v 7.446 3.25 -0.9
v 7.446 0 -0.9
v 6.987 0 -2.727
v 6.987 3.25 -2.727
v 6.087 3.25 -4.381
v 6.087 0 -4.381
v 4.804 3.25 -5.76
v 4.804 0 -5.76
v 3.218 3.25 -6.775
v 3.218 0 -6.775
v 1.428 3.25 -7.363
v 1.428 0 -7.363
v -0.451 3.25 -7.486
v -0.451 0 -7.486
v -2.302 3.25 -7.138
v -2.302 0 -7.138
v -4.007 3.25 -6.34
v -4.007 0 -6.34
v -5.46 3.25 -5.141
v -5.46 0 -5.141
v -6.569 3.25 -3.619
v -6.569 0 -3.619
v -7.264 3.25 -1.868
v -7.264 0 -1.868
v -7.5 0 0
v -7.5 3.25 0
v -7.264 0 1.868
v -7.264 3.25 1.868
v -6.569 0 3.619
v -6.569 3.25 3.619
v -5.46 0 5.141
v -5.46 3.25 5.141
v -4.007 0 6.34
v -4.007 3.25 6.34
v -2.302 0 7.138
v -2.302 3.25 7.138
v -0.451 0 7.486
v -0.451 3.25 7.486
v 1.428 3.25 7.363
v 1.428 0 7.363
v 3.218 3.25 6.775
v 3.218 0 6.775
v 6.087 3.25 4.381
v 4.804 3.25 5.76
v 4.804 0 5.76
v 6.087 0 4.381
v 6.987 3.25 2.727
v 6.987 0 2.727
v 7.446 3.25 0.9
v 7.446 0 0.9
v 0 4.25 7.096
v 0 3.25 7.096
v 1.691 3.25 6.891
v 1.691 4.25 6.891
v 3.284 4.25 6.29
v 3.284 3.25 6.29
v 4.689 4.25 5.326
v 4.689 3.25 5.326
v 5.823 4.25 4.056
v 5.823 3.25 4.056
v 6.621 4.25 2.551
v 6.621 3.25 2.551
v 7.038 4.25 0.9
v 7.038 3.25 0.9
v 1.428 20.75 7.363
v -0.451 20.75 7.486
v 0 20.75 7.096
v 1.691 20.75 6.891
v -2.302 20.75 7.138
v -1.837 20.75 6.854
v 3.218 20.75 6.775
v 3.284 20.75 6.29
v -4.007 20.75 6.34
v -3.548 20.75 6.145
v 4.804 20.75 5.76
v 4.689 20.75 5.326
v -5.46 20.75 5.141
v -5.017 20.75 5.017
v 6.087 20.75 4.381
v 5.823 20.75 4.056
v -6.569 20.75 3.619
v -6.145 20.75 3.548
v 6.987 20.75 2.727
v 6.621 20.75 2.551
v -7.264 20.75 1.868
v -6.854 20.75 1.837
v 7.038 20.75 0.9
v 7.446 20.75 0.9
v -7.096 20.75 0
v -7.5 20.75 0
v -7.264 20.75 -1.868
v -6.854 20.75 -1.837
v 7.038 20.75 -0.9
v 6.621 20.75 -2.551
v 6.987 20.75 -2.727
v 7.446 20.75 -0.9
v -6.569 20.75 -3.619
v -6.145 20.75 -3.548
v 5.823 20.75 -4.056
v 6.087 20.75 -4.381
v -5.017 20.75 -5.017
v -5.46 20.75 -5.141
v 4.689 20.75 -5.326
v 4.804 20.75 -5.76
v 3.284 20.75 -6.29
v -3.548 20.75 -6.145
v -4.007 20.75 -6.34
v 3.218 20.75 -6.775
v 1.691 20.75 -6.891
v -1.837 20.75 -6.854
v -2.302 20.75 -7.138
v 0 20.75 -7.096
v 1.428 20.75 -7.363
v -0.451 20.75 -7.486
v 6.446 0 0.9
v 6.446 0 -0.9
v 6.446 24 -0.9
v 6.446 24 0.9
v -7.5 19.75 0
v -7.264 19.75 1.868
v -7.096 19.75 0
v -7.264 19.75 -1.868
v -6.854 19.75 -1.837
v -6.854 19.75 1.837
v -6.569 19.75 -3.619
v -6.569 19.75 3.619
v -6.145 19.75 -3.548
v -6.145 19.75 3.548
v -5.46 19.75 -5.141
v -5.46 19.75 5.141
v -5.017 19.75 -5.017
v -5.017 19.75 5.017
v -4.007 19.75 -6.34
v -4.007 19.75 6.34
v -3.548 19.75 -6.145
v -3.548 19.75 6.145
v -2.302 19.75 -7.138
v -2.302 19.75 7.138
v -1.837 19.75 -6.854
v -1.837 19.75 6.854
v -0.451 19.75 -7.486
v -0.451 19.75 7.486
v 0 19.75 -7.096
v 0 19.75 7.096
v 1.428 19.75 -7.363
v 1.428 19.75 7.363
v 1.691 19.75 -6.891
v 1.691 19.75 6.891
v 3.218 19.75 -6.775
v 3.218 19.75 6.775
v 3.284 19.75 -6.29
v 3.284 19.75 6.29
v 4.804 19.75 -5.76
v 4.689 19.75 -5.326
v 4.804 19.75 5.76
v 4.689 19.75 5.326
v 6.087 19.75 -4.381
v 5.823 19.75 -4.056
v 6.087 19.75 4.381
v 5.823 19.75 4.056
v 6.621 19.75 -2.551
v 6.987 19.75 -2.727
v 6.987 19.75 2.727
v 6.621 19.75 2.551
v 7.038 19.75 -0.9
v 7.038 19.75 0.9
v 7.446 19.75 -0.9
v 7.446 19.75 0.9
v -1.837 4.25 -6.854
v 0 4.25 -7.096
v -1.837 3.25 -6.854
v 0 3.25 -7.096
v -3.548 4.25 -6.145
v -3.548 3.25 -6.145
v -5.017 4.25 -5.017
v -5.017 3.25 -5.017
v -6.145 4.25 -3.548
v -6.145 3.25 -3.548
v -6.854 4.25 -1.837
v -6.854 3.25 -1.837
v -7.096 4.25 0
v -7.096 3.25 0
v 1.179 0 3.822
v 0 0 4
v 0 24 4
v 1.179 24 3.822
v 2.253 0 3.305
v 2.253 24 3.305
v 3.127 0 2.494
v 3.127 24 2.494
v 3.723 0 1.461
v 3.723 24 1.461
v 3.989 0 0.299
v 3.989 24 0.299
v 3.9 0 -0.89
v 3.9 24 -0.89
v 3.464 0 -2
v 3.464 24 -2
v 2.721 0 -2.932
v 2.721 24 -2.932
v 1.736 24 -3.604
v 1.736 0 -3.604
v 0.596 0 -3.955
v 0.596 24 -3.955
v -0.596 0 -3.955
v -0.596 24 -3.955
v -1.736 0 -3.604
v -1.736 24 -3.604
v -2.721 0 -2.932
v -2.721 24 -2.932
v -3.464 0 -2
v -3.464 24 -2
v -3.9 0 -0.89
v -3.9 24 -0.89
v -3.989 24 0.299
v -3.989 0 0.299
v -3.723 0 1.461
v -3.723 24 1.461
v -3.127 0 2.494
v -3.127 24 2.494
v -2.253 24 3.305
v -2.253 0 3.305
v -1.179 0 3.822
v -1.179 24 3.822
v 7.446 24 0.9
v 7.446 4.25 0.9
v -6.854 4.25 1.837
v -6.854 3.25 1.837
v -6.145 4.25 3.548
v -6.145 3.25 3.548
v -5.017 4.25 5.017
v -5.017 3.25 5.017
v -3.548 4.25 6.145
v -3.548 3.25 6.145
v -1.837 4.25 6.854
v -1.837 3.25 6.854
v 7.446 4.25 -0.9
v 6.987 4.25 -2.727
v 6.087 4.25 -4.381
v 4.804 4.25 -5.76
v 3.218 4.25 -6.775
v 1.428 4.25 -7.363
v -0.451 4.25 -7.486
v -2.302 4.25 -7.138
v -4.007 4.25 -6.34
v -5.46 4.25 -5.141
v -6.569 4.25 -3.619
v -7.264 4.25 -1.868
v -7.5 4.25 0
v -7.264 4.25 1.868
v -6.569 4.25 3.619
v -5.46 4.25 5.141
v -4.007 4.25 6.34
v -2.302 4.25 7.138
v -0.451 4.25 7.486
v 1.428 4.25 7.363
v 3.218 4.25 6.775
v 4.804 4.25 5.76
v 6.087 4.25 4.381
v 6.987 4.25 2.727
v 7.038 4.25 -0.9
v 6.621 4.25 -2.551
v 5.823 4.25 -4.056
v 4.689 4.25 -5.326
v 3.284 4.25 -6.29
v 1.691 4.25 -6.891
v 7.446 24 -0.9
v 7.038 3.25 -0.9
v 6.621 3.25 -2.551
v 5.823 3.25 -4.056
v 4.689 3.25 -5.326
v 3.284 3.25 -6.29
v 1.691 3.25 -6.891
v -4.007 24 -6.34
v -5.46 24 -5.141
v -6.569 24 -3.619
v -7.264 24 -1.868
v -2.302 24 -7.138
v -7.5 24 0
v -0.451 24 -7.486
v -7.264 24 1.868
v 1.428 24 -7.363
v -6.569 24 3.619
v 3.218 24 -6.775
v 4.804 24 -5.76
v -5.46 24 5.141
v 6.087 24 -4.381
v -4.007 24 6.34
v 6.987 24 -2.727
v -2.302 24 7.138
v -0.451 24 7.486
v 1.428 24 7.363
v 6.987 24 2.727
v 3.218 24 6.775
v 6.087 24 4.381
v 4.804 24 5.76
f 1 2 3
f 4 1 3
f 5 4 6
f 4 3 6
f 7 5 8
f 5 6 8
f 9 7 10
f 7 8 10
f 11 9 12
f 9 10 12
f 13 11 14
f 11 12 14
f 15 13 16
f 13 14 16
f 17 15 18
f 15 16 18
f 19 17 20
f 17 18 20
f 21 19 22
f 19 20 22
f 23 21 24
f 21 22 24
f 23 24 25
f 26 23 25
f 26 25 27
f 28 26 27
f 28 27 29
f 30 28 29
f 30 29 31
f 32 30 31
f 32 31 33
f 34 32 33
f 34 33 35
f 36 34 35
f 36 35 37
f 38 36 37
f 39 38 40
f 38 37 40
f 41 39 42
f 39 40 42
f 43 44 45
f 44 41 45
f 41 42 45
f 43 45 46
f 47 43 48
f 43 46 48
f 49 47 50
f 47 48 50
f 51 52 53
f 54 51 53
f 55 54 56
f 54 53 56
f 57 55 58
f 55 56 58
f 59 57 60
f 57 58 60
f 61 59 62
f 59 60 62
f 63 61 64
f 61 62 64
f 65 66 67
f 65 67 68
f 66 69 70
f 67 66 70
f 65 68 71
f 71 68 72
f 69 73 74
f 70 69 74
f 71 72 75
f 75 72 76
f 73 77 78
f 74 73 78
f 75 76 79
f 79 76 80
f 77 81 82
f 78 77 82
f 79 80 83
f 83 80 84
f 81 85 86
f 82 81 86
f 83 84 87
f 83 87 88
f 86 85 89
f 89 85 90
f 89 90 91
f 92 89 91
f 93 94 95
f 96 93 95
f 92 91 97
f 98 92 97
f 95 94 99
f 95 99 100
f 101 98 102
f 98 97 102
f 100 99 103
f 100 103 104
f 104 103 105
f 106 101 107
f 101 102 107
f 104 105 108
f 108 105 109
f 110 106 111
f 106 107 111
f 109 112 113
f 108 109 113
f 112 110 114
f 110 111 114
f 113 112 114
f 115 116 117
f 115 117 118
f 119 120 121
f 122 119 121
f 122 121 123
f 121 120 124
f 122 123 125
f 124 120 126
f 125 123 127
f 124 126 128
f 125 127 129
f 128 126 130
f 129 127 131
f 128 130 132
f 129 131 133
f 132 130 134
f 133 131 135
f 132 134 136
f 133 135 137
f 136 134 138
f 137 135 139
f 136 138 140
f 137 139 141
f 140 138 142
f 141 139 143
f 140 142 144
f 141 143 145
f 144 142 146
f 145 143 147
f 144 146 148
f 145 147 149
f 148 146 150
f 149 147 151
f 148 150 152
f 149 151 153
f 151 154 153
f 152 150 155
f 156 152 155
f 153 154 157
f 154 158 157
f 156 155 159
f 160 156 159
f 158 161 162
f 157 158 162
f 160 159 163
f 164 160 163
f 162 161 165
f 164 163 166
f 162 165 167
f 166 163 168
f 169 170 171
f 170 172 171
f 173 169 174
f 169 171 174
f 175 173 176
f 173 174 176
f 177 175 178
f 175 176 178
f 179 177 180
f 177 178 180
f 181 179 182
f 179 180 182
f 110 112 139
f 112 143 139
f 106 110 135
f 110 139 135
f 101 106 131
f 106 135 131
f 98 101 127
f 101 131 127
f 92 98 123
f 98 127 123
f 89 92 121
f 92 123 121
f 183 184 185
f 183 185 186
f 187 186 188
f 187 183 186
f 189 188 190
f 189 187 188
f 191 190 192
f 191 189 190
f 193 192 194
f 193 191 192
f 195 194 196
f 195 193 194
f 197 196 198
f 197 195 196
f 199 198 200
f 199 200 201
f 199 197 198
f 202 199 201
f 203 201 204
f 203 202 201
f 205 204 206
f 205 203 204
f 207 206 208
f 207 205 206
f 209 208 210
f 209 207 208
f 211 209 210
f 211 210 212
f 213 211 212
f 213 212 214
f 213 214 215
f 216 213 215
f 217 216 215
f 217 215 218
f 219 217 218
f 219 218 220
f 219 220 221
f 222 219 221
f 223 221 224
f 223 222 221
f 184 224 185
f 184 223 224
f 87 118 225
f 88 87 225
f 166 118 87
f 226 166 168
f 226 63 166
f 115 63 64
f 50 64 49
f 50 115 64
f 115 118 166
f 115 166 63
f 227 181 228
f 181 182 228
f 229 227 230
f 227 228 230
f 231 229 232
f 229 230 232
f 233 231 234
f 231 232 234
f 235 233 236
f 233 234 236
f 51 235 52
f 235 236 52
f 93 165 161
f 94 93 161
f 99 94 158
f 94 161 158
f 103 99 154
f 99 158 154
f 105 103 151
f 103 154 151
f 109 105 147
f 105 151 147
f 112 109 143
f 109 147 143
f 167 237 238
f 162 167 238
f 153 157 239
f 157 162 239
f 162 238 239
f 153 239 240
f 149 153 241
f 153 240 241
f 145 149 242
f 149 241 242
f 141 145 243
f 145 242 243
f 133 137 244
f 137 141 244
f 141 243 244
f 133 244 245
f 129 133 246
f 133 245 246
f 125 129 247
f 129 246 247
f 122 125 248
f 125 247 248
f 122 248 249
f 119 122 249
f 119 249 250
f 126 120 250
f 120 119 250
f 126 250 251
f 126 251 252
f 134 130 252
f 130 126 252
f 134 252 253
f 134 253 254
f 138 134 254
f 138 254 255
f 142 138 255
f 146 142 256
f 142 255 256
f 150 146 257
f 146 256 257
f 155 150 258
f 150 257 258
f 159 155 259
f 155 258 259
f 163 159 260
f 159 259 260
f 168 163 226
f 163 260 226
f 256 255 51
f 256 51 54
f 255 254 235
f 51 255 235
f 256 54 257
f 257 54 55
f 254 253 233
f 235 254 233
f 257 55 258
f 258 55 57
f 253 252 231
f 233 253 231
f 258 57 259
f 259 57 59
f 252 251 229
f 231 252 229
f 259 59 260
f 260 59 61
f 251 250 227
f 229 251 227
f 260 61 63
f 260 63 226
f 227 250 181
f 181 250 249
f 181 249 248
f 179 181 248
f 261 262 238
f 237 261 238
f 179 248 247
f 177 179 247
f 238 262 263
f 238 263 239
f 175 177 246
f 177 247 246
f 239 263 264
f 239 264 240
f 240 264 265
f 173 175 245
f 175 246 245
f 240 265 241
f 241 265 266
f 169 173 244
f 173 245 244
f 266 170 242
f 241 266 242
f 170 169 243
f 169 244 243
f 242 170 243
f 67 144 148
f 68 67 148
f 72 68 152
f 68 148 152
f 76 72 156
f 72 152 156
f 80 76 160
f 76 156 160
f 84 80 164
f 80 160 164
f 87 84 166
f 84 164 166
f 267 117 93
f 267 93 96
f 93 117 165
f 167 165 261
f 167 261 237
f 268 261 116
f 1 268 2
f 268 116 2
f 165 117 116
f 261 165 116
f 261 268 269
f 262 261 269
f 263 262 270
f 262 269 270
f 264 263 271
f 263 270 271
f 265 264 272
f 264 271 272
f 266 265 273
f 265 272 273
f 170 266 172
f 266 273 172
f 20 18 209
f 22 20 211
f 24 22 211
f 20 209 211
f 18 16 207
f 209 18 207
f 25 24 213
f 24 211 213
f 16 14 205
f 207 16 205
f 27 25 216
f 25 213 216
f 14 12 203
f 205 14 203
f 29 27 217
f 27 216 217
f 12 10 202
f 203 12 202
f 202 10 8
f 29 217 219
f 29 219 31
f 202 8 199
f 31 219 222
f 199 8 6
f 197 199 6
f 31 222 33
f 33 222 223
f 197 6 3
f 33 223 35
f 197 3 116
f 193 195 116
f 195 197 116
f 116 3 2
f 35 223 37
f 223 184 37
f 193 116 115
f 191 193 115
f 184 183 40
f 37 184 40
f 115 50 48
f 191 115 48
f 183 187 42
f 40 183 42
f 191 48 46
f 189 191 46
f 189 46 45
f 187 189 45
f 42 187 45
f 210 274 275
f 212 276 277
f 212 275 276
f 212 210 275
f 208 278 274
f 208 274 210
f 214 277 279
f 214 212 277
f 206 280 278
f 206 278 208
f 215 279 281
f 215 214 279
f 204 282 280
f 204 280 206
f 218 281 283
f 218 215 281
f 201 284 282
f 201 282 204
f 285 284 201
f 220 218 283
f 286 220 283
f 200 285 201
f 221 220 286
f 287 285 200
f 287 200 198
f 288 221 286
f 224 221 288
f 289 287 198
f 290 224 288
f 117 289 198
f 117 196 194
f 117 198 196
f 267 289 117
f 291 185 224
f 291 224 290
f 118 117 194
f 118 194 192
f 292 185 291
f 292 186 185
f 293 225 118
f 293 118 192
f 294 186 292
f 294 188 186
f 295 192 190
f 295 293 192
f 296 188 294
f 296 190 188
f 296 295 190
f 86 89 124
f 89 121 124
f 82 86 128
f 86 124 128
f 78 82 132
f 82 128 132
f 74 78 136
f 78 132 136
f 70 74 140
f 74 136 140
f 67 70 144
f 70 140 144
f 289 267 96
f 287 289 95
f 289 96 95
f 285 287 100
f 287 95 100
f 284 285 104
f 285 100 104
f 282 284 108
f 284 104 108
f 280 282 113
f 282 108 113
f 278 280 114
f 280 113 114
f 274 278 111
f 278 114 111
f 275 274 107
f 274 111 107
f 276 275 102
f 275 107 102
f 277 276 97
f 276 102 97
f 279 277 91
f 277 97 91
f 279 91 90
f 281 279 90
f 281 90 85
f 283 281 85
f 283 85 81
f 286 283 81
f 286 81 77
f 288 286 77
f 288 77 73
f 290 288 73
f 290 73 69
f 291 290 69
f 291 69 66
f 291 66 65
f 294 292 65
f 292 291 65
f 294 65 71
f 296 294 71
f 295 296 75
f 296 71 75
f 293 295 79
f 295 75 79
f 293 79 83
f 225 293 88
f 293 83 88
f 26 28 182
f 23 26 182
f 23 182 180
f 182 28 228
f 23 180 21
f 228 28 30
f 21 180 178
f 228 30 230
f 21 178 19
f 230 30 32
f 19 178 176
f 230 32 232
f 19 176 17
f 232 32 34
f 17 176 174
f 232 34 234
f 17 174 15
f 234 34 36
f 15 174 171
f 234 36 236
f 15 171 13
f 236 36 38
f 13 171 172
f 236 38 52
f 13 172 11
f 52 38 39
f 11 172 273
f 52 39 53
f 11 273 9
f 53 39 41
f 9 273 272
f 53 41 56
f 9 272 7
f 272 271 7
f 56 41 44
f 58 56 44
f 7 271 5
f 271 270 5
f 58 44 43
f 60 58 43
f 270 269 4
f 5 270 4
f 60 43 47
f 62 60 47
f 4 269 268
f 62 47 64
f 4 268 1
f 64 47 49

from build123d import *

# Parameters (mm, degrees)
CROQUIS1_R              = 7.5
CROQUIS1_R_2            = 4
SALIENTE_EXTRUIR1_DEPTH = 24
CROQUIS2_W              = 2
CROQUIS2_H              = 1.8
CORTAR_EXTRUIR1_DEPTH   = 27.239283527
CROQUIS3_W              = 1
CROQUIS3_H              = 1


with BuildPart() as part:
    # Croquis1 → Saliente-Extruir1 (new body)
    with BuildSketch(Plane(origin=(0, 0, 0), x_dir=(1, 0, 0), z_dir=(0, 1, 0))):
        with Locations(Location((0, 0, 0), (0, 0, 270))):
            Circle(CROQUIS1_R)
        with Locations(Location((0, 0, 0), (0, 0, 270))):
            Circle(CROQUIS1_R_2, mode=Mode.SUBTRACT)
    extrude(amount=SALIENTE_EXTRUIR1_DEPTH)

    # Croquis2 → Cortar-Extruir1 (cut, through all)
    with BuildSketch(Plane.XZ):
        with Locations((7.445804188, 0)):
            Rectangle(CROQUIS2_W, CROQUIS2_H)
    extrude(amount=-CORTAR_EXTRUIR1_DEPTH, mode=Mode.SUBTRACT)

    # Cortar-Barrer3: sweep along a curve in space
    with BuildLine() as cortar_barrer3_path:
        ThreePointArc((0, 24, 4), (2.828427125, 24, 2.828427125), (4, 24, 0))
        ThreePointArc((4, 24, 0), (2.828427125, 24, -2.828427125), (0, 24, -4))
        ThreePointArc((0, 24, -4), (-2.828427125, 24, -2.828427125), (-4, 24, 0))
        ThreePointArc((-4, 24, 0), (-2.828427125, 24, 2.828427125), (0, 24, 4))
    # Croquis3 → Cortar-Barrer3 (sweep, cut)
    with BuildSketch(Plane.XY):
        with Locations((7.595804188, 20.25)):
            Rectangle(CROQUIS3_W, CROQUIS3_H)
        with Locations((7.595804188, 3.75)):
            Rectangle(CROQUIS3_W, CROQUIS3_H)
        with Locations((-7.595804188, 3.75)):
            Rectangle(CROQUIS3_W, CROQUIS3_H)
        with Locations((-7.595804188, 20.25)):
            Rectangle(CROQUIS3_W, CROQUIS3_H)
    sweep(path=cortar_barrer3_path.line, mode=Mode.SUBTRACT)


solid = part.part
